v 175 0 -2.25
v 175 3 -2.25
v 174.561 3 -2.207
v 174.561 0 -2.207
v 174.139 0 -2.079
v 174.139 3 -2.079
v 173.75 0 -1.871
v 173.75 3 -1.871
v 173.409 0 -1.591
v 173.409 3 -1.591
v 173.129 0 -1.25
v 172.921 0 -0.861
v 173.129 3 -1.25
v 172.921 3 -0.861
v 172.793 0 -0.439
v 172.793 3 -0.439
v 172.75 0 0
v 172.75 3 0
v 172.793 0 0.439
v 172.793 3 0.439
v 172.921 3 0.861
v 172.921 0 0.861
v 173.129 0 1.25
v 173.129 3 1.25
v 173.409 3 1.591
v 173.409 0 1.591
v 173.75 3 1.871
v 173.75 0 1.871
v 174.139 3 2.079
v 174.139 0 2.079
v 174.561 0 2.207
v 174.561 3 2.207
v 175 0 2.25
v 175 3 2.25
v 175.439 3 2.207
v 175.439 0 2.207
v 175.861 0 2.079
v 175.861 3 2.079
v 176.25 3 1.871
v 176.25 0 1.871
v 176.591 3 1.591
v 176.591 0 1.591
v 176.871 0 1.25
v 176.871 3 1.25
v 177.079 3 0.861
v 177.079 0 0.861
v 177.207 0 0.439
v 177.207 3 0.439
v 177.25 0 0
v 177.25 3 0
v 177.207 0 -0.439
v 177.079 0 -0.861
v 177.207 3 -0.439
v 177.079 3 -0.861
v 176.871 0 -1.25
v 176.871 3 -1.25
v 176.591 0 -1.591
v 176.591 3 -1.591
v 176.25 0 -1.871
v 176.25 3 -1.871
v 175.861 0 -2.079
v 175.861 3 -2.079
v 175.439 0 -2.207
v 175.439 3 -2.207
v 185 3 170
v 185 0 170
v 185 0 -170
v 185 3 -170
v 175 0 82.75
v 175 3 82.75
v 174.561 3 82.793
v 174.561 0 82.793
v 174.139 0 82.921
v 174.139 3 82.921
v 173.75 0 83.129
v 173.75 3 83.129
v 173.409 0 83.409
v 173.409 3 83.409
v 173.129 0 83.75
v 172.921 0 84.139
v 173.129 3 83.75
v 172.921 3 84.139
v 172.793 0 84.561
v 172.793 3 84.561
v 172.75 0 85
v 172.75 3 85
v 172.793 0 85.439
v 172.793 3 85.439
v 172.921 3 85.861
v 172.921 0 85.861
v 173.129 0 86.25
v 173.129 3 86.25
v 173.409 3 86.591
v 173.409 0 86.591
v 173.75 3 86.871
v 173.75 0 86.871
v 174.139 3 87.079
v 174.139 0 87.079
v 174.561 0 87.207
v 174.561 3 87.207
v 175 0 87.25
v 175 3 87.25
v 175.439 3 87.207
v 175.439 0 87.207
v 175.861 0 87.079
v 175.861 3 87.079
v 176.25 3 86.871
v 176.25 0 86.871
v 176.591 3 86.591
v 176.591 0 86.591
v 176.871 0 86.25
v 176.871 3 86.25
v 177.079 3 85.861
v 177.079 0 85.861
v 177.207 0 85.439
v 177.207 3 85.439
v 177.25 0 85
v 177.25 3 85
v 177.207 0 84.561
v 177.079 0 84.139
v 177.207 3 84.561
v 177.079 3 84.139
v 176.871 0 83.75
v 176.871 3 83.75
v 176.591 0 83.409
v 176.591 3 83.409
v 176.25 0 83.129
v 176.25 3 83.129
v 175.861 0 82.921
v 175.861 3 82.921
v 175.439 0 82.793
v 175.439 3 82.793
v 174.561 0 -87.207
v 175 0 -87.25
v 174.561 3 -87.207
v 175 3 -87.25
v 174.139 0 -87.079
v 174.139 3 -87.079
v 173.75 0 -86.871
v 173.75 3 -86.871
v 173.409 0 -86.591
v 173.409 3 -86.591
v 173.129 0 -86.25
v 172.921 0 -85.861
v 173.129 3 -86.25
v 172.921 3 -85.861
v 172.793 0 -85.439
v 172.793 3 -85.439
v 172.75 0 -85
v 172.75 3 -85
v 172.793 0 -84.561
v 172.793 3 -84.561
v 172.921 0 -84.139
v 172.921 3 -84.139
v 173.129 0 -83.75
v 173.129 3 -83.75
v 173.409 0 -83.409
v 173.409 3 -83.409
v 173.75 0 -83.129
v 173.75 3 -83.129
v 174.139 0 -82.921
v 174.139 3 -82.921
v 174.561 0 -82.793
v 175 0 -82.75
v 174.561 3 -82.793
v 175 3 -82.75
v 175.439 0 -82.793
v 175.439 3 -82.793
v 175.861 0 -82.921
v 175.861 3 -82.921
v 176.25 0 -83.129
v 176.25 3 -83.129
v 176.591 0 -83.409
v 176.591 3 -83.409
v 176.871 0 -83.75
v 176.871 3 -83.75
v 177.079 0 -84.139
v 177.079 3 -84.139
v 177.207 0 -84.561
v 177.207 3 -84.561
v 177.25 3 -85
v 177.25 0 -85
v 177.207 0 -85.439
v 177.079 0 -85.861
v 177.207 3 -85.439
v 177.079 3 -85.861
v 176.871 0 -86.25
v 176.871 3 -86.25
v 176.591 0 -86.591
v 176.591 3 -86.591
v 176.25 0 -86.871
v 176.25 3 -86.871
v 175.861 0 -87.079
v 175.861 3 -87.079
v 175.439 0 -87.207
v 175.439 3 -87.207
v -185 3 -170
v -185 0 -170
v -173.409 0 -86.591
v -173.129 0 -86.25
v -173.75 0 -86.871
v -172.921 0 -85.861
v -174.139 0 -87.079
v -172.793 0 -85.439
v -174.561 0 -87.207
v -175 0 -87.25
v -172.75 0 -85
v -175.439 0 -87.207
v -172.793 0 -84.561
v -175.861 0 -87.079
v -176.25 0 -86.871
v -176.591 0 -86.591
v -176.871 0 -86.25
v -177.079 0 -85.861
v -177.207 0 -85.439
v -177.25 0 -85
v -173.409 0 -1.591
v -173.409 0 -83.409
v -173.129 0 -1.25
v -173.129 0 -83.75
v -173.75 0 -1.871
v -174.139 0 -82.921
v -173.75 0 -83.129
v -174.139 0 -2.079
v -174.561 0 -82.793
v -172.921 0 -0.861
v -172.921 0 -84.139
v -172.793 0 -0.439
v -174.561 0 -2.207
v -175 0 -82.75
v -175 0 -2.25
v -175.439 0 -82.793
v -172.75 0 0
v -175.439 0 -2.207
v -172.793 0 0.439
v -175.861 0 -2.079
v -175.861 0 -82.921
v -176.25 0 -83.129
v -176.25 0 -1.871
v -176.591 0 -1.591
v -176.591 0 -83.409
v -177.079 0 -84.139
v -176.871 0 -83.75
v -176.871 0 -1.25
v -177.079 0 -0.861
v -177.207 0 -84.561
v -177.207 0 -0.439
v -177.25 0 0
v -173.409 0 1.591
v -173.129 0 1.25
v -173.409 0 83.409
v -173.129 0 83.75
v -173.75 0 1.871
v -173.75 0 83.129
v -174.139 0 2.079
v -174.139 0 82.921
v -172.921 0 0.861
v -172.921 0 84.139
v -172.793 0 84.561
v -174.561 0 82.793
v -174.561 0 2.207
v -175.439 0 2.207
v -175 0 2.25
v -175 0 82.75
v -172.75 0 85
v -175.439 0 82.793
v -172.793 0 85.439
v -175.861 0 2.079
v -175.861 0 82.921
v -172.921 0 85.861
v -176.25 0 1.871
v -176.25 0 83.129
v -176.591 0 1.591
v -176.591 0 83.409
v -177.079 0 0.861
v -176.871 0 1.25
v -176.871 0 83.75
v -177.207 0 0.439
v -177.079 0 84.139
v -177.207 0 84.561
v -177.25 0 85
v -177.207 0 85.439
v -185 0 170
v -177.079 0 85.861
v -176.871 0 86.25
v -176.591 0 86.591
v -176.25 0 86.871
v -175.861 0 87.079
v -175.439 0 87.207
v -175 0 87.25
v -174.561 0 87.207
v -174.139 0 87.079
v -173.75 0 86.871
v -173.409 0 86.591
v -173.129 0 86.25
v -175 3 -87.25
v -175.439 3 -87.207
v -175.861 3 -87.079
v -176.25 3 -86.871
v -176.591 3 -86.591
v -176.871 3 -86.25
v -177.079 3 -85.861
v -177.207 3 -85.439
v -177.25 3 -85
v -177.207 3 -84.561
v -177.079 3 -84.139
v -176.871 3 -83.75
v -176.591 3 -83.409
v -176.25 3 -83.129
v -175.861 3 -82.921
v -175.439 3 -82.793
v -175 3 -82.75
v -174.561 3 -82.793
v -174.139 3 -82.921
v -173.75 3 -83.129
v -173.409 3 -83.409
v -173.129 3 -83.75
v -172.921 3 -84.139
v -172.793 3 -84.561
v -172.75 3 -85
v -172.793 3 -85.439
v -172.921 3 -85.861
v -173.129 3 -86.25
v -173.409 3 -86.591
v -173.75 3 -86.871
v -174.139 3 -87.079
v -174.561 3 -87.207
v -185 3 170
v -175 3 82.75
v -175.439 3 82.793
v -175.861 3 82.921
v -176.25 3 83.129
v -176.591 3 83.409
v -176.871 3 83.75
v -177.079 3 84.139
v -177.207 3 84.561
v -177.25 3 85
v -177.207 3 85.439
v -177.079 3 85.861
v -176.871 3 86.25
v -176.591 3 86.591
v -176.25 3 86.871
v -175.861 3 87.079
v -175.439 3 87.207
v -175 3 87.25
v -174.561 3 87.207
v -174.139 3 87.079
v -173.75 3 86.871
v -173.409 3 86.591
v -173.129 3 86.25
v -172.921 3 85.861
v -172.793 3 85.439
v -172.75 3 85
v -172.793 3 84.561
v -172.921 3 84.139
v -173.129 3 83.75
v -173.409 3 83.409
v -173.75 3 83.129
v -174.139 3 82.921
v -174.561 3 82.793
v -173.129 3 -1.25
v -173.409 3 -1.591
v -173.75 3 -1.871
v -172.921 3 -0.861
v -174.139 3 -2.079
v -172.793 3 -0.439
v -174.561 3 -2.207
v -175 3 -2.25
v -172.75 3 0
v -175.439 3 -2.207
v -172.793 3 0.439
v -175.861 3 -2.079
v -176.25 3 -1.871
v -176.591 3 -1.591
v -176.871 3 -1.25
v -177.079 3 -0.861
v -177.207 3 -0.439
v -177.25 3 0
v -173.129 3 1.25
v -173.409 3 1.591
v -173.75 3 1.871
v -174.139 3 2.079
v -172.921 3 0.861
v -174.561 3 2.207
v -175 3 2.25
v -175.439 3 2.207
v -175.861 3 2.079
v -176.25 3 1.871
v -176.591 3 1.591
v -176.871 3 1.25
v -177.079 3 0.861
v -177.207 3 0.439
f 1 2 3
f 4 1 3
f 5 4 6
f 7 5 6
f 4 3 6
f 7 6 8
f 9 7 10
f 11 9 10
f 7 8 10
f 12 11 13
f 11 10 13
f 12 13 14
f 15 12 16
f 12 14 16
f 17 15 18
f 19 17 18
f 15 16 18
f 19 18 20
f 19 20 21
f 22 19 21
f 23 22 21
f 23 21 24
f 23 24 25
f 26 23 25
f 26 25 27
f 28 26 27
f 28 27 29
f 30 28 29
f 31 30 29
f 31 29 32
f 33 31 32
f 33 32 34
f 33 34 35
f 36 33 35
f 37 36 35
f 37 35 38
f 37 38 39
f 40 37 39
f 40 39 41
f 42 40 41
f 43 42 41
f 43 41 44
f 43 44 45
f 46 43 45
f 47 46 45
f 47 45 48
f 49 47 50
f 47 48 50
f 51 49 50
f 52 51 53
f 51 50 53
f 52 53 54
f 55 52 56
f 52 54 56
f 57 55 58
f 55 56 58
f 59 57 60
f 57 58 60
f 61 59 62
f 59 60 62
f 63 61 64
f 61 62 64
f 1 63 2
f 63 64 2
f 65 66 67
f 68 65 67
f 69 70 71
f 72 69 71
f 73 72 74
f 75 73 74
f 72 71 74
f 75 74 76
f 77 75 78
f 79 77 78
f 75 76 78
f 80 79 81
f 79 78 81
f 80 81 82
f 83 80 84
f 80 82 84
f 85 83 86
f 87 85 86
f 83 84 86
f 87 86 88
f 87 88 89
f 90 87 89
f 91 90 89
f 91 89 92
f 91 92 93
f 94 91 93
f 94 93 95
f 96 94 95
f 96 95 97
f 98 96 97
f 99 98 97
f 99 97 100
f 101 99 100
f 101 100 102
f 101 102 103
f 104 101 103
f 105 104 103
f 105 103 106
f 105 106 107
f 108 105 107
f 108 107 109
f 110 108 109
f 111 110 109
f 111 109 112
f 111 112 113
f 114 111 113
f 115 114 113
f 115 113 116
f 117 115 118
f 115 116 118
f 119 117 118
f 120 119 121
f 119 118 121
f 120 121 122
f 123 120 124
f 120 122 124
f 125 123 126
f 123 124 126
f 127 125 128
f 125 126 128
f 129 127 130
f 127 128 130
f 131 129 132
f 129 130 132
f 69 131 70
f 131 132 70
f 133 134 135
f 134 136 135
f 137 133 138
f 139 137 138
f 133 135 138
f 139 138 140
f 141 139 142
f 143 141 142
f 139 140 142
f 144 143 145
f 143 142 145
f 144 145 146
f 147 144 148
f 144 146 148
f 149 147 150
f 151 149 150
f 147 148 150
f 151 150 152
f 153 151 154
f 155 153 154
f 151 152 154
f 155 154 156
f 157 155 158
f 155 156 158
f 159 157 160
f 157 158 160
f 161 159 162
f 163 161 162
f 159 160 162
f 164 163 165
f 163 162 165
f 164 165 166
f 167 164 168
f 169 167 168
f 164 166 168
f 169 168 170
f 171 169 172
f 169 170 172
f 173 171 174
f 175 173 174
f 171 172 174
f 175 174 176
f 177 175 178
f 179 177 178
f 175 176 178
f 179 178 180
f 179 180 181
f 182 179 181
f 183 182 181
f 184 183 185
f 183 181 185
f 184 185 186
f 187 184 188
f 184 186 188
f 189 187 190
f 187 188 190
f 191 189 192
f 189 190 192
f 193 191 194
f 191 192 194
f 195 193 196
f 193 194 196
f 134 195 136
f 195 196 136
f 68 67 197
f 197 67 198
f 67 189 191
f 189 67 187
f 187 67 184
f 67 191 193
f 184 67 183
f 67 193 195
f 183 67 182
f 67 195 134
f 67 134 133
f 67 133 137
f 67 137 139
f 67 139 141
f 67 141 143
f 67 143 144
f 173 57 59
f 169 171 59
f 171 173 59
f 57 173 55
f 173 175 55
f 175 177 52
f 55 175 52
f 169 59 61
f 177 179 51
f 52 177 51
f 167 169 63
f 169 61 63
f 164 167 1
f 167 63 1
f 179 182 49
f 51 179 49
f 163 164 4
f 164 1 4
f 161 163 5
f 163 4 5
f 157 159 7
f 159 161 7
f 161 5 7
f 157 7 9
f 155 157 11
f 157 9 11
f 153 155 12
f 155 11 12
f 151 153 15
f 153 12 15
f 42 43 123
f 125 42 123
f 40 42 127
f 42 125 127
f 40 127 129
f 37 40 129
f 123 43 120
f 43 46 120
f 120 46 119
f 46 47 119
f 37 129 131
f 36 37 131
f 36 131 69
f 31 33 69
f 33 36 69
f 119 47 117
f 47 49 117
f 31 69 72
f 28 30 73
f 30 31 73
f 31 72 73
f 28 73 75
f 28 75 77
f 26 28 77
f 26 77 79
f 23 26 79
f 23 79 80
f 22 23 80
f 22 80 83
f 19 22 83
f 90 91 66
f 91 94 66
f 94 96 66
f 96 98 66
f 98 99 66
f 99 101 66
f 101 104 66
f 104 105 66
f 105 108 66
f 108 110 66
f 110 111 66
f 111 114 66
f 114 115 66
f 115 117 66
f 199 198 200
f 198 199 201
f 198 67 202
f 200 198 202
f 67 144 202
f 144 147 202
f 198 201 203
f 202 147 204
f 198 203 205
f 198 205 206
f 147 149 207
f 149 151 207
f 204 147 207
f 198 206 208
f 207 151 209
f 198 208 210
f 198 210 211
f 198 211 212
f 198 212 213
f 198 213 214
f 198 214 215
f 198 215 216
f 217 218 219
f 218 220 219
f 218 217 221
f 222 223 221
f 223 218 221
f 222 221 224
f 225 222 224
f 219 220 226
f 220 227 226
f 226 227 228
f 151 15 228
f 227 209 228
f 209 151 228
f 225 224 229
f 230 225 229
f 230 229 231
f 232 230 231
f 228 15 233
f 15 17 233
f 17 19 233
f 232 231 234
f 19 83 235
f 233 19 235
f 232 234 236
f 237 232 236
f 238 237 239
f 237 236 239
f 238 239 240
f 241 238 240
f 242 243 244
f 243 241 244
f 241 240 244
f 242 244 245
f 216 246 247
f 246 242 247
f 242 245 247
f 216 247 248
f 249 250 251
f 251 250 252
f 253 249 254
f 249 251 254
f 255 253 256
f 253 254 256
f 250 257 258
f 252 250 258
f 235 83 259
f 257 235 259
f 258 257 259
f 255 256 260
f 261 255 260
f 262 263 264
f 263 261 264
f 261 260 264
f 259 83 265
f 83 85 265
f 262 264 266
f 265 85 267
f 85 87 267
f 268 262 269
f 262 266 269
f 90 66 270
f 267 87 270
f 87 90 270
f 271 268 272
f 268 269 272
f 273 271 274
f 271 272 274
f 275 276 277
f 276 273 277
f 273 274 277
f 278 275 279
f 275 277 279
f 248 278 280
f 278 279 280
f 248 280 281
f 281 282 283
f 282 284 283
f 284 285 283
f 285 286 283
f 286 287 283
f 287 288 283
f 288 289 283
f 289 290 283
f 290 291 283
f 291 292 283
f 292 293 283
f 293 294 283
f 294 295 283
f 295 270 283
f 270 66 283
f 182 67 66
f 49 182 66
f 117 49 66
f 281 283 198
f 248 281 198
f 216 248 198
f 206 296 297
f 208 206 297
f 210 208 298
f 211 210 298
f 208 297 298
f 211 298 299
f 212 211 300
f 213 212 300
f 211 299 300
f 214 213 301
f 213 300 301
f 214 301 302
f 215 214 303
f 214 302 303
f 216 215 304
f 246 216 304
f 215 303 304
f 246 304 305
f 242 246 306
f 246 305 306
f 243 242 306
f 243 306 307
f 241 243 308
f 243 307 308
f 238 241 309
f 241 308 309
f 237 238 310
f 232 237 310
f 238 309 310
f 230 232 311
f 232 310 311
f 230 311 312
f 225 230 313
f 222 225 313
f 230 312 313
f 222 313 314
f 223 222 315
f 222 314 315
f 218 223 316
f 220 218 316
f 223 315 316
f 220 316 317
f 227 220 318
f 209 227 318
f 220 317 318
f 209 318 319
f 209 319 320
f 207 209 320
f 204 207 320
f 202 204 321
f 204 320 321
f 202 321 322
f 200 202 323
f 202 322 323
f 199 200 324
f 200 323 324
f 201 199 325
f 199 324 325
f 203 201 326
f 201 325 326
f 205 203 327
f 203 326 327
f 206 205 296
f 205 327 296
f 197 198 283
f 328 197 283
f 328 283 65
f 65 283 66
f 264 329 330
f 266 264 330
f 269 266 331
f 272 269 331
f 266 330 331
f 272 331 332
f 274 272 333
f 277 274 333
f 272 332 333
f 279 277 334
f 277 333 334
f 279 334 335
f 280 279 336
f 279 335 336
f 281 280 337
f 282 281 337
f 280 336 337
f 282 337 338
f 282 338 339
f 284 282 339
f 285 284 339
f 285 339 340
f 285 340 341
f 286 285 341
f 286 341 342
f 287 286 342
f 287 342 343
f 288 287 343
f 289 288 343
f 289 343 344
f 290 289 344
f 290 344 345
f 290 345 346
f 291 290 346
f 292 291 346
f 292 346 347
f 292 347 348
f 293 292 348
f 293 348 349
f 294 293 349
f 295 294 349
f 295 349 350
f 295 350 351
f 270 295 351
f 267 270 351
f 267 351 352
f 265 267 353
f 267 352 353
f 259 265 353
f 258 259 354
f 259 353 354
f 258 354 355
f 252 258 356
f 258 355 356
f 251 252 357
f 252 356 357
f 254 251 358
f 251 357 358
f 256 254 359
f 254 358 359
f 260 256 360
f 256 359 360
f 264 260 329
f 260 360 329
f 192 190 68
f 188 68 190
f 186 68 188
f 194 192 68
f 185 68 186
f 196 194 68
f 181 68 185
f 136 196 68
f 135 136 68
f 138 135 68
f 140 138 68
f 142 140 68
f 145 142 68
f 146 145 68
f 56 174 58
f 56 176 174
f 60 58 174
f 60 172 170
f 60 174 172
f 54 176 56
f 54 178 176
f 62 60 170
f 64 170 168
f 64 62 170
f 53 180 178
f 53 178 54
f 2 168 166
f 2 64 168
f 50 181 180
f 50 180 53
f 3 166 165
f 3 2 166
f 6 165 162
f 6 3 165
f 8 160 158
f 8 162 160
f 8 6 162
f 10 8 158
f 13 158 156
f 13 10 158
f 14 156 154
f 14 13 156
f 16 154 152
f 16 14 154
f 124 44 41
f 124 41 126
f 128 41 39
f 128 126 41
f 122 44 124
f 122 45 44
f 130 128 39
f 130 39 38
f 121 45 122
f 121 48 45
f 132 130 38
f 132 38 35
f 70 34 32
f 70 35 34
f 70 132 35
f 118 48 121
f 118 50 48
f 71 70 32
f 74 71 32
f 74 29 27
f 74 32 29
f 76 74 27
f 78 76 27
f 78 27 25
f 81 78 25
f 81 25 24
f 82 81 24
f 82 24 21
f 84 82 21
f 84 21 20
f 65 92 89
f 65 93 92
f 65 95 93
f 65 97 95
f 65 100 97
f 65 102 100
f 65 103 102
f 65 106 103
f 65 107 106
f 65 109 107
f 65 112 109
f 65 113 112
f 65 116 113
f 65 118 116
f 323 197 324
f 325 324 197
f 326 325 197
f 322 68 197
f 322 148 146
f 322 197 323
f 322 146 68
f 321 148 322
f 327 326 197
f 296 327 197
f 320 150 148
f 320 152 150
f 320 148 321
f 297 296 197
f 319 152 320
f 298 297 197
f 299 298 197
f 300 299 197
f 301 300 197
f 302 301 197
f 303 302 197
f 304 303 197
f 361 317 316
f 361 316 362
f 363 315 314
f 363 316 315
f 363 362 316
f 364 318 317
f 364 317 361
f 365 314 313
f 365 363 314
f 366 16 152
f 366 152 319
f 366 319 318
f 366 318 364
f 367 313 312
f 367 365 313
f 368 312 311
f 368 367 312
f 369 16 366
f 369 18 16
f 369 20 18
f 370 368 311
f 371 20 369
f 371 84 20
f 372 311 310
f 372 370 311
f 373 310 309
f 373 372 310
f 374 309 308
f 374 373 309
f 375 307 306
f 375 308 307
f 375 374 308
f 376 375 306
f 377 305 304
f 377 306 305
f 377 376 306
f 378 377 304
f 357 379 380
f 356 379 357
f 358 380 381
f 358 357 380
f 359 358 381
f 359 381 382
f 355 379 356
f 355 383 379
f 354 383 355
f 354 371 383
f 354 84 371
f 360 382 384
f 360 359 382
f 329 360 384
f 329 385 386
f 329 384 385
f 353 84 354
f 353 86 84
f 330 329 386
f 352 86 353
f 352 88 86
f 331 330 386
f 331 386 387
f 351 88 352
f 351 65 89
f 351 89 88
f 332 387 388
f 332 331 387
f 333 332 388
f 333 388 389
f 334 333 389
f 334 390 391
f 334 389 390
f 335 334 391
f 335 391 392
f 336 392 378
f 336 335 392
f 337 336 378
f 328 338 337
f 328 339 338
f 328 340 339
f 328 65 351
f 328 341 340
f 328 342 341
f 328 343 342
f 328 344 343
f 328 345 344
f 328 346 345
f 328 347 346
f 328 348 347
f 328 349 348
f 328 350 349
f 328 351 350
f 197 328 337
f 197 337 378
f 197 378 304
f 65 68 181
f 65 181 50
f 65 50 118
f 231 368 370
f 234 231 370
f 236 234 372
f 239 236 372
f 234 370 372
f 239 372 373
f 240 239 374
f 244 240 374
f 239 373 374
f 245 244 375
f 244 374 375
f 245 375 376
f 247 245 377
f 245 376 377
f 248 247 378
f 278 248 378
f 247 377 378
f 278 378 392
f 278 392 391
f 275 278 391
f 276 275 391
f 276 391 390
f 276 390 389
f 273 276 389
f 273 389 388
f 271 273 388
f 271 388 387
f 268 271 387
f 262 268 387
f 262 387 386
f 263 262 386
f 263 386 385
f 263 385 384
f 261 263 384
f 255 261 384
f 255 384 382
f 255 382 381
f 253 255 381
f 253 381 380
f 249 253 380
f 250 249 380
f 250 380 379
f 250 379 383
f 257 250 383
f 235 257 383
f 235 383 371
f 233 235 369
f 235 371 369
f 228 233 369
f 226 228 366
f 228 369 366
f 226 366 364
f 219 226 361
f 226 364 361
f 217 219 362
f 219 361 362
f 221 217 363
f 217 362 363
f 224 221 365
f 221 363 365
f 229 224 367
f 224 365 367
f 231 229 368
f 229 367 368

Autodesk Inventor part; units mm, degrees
ref_plane "YZ Plane" through (0, 0, 0) normal (1, 0, 0) x (0, 1, 0)
ref_plane "XZ Plane" through (0, 0, 0) normal (0, 1, 0) x (-1, 0, 0)
ref_plane "XY Plane" through (0, 0, 0) normal (0, 0, 1) x (1, 0, 0)
sketch "Sketch1" plane through (0, 0, 0) normal (0, 1, 0) x (-1, 0, 0)
  line L0 (185, 170) -> (-185, 170)
  line L1 (-185, 170) -> (-185, -170)
  line L2 (-185, -170) -> (185, -170)
  line L3 (185, -170) -> (185, 170)
  line L4 (185, 170) -> (-185, -170) construction
  line L5 (-185, 170) -> (185, -170) construction
  point P0 (0, 0)
  dimension "d0" = 340
  dimension "d1" = 370
extrude "Extrusion1" add sketch "Sketch1" along normal blind 3
sketch "Sketch3" plane through (0, 0, 0) normal (0, -1, 0) x (1, 0, 0)
  line L0 (-185, -170) -> (-185, 170) projected
  line L1 (185, -170) -> (-185, -170) projected
  line L2 (-185, 170) -> (185, 170) projected
  point P0 (0, 0)
  point P1 (-175, 0)
  point P2 (-175, -85)
  point P3 (-175, 85)
  point P4 (175, 85)
  point P5 (175, 0)
  point P6 (175, -85)
  dimension "d22" = 10
  dimension "d23" = 170
  dimension "d24" = 10
  dimension "d25" = 85
  dimension "d26" = 10
  dimension "d27" = 85
  dimension "d30" = 360
hole "Hole2" at (-175, 0, 0) at (-175, 0, -85) at (-175, 0, 85) at (175, 0, 85) at (175, 0, 0) at (175, 0, -85) direction (0, 1, 0) diameter 4.5 end through all
equation "\"d24\" = d22"
equation "\"d25\" = 0.5 * d23"
equation "\"d26\" = d22"
equation "\"d27\" = d25"
properties part number "inner_panel"
